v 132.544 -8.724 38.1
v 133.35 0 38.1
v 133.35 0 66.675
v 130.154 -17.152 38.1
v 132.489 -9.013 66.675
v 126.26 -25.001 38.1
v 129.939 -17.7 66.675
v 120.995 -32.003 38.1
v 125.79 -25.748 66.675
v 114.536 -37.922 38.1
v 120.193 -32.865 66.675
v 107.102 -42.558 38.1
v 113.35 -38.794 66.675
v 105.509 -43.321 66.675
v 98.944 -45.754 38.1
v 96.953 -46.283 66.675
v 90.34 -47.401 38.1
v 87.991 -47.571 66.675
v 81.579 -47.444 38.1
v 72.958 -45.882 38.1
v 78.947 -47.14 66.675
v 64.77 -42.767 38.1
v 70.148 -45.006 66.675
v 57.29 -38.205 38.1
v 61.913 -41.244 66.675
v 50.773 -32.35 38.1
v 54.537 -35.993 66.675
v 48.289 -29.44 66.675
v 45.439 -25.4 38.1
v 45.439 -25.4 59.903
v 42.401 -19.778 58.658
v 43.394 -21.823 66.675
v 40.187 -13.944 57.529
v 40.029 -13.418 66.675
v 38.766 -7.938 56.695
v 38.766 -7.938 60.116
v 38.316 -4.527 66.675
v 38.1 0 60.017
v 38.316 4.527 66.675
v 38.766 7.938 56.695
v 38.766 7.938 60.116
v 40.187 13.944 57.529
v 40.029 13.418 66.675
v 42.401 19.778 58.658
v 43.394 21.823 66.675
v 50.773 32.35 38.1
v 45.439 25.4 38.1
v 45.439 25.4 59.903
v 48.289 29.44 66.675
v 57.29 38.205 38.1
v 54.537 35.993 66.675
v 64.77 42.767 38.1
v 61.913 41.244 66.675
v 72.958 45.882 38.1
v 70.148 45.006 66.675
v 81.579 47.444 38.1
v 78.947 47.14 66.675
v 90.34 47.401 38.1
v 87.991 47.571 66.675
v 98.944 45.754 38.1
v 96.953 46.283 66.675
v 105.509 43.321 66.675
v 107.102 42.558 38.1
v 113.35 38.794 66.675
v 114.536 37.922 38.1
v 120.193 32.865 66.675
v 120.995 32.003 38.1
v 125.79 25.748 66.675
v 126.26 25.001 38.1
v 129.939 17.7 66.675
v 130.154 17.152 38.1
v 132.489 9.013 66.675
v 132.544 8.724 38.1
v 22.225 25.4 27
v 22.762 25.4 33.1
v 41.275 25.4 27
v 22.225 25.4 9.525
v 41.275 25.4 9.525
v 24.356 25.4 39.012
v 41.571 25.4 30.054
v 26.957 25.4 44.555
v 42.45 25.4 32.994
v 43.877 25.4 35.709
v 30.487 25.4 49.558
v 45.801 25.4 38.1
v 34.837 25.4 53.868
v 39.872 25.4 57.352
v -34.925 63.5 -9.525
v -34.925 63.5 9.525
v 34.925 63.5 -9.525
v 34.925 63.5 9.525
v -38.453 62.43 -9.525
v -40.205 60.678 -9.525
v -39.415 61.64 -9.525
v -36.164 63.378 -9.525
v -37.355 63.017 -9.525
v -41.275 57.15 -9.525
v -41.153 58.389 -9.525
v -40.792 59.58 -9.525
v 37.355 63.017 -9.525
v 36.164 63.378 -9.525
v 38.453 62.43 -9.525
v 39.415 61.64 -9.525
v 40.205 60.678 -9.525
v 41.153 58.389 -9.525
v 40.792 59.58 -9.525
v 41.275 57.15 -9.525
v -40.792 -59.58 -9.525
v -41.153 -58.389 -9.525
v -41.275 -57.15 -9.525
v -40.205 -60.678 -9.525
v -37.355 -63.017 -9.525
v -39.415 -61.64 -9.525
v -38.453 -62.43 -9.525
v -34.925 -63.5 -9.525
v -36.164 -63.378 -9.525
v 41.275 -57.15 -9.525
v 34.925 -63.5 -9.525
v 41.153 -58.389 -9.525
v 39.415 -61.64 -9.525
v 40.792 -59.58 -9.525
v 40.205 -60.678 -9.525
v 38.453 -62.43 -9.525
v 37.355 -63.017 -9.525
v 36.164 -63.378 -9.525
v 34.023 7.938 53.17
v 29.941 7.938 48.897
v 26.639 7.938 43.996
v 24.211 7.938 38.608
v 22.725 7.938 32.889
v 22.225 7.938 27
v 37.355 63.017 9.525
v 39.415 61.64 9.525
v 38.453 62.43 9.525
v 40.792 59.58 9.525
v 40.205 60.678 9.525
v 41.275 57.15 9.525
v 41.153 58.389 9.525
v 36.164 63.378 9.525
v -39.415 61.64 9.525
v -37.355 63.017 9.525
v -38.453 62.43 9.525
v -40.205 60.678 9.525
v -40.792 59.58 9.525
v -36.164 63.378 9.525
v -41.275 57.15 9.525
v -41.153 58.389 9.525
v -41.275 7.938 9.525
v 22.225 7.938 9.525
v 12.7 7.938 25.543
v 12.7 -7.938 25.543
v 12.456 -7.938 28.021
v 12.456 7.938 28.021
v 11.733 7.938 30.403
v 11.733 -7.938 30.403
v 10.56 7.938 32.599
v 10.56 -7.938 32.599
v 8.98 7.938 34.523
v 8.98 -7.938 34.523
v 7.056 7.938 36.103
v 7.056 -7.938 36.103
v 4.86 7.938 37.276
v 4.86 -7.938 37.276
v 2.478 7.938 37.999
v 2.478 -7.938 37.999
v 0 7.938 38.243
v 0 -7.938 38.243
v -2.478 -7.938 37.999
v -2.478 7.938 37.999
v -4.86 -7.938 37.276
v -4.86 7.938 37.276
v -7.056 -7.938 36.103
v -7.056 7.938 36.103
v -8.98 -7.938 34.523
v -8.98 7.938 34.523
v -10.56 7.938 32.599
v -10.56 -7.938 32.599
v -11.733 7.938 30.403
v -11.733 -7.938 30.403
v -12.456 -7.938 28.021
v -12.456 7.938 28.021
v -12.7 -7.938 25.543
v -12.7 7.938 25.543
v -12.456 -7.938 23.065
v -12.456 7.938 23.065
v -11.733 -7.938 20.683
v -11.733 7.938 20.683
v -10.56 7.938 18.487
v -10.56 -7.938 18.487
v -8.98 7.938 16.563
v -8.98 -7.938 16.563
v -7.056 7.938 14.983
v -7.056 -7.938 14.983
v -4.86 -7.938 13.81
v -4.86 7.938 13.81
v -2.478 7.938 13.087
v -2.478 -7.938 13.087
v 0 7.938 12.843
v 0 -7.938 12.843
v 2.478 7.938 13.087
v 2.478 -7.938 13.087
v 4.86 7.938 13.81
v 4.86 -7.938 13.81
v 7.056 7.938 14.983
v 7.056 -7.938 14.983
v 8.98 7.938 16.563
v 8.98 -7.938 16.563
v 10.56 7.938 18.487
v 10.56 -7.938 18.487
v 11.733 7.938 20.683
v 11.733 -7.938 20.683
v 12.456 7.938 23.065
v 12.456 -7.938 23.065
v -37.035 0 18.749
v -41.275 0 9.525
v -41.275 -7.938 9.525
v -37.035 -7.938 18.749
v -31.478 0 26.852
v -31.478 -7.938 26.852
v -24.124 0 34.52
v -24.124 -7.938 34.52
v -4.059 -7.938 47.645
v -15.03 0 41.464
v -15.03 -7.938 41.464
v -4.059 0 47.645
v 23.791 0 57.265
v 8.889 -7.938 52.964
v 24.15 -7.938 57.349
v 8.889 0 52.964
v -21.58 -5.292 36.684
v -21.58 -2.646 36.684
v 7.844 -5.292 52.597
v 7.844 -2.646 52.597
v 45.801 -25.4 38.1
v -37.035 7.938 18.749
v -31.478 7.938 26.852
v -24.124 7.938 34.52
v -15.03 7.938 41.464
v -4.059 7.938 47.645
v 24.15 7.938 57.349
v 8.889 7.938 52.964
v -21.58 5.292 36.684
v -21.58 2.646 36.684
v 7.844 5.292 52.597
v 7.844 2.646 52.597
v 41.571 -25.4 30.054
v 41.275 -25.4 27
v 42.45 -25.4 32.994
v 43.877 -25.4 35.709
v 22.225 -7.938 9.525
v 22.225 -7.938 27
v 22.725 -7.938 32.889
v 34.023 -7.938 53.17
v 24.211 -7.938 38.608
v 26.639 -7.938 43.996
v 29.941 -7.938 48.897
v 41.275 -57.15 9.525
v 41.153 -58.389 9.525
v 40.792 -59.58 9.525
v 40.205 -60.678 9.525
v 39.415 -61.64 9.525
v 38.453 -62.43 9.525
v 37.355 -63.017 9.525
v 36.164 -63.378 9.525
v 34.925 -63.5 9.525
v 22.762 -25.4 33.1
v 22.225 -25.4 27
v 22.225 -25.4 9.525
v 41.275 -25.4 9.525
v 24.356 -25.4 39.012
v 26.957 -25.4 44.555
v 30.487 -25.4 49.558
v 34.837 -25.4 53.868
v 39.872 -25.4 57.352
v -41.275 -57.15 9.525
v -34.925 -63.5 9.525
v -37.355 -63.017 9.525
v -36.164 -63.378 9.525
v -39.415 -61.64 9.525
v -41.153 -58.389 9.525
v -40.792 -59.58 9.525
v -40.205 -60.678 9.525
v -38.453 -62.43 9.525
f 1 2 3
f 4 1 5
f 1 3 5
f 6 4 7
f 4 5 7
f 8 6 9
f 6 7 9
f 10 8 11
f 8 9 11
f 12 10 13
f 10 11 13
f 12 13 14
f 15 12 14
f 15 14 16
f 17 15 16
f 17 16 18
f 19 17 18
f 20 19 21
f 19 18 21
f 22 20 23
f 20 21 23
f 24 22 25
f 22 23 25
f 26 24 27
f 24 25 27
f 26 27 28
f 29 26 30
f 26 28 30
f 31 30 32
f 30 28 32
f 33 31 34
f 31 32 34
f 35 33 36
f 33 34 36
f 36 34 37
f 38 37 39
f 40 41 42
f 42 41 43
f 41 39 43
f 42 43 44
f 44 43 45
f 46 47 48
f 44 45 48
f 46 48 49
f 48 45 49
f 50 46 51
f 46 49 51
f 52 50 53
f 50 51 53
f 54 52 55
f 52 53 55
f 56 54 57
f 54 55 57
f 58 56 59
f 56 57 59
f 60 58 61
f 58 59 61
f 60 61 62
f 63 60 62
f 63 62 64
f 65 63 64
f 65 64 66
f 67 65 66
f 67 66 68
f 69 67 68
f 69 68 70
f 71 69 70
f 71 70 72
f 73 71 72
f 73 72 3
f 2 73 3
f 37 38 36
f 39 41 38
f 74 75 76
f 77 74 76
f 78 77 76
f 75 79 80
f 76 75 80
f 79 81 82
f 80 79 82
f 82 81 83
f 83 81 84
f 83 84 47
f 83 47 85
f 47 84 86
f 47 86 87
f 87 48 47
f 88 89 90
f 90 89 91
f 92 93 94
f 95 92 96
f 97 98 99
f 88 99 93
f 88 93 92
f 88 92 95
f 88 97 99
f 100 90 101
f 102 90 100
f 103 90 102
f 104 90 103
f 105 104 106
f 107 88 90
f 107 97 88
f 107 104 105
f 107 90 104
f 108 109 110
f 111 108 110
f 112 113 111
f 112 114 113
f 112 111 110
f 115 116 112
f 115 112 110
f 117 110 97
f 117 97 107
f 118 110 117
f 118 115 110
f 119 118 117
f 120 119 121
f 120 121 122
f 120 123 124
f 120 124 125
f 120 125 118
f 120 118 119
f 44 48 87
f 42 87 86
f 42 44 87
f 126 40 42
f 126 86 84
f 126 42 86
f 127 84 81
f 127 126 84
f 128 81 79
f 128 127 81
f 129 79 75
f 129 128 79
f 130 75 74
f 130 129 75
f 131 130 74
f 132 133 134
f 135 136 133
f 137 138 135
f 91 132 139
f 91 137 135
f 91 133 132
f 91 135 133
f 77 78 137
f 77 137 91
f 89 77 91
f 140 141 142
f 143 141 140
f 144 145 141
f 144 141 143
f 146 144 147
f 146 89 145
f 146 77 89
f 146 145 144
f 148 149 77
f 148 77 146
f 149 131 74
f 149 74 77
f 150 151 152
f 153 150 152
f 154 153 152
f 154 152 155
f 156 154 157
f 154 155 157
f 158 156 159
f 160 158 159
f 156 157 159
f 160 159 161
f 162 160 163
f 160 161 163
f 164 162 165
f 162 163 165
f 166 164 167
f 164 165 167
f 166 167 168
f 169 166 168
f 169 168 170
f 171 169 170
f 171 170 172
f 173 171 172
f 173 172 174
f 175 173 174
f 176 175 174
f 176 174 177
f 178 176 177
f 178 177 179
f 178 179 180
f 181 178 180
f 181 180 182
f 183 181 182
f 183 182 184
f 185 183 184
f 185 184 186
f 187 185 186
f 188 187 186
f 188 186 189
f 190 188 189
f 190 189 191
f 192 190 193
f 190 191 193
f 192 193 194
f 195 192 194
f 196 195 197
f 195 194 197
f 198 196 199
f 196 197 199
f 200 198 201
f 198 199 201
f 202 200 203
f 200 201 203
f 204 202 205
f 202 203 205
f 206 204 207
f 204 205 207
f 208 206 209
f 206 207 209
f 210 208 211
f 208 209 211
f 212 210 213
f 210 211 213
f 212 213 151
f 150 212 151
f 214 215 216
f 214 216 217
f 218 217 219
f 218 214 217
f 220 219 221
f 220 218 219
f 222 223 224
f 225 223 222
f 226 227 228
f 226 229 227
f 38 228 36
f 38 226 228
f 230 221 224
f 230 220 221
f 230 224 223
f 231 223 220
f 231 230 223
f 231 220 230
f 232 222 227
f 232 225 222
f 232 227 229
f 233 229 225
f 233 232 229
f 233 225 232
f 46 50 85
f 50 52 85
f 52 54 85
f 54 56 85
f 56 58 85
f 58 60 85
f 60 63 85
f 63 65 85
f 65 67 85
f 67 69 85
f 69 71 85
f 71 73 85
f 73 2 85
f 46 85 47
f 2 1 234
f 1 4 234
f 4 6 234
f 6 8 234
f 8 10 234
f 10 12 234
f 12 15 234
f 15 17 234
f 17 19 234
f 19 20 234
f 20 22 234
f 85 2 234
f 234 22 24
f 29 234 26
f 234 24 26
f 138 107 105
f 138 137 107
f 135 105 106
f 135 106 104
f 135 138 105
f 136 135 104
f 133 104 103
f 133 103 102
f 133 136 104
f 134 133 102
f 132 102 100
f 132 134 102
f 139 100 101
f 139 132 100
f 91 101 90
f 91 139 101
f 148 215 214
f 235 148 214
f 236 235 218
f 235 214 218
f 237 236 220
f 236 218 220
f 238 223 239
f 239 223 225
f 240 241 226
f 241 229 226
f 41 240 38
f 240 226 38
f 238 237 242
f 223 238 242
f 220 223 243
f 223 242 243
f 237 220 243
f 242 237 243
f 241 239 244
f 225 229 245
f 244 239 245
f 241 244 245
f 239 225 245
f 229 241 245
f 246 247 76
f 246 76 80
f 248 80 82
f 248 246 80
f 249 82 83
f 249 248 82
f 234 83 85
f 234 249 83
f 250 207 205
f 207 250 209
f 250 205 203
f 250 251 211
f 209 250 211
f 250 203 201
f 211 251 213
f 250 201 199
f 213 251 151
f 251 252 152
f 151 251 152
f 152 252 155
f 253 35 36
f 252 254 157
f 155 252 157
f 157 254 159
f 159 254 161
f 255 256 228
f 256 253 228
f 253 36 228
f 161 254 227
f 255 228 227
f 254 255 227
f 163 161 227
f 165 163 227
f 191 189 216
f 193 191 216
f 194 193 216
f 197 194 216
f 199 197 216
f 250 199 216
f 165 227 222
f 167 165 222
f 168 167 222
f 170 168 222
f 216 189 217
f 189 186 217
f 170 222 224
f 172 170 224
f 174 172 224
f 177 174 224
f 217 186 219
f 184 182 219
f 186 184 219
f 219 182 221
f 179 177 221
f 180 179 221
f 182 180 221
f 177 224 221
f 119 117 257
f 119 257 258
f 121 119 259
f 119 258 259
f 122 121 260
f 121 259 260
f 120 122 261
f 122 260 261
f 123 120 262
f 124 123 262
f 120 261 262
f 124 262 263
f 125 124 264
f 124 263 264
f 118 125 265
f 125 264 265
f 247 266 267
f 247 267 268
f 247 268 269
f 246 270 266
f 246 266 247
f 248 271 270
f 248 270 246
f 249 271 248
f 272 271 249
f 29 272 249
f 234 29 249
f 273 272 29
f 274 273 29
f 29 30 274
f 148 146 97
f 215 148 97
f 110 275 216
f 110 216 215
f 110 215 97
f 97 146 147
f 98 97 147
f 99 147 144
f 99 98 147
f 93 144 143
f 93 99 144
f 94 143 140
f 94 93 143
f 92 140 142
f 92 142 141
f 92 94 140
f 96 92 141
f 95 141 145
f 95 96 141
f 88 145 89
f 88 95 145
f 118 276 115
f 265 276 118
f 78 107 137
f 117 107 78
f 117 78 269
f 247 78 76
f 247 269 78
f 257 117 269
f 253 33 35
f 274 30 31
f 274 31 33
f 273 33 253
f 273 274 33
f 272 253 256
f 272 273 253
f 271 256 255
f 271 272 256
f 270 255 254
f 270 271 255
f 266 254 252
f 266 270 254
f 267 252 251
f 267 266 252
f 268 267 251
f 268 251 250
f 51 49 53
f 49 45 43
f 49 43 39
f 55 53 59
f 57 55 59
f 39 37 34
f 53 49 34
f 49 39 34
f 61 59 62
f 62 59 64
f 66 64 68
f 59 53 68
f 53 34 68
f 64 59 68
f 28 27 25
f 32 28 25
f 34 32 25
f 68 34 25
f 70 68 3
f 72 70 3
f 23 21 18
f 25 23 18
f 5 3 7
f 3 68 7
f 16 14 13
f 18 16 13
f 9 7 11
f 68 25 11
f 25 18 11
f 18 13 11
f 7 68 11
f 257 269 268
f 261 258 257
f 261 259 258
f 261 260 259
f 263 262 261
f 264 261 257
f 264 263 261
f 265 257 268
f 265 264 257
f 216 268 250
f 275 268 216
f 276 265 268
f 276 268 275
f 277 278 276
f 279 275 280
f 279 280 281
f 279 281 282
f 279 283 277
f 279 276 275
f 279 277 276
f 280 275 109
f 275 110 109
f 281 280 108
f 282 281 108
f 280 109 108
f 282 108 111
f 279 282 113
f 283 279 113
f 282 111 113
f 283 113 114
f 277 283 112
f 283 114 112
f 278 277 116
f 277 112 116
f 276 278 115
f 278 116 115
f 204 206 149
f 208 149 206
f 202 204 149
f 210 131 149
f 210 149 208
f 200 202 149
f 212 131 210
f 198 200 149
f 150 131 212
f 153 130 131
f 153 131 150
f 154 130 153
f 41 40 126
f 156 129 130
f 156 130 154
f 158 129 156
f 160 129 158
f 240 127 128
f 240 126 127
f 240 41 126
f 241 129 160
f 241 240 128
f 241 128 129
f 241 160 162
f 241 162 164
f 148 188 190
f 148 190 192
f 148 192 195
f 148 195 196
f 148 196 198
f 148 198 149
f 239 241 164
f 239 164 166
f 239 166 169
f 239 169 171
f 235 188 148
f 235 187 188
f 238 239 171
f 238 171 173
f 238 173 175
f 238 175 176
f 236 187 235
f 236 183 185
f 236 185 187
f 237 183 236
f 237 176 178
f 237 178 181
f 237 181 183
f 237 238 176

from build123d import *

# Parameters (mm, degrees)
F1_DEPTH = 63.5
F2_DEPTH = 25.4
F3_DEPTH = 7.9375
F5_R     = 6.35
F6_R     = 12.7
F7_DEPTH = 50.8


with BuildPart() as f1:
    # F0 (on Front) → F1 (new body, symmetric)
    with BuildSketch(Plane.XZ):
        Polygon((22.225, 9.525), (-41.275, 9.525), (-41.275, -9.525), (41.275, -9.525), (41.275, 9.525), align=None)
    extrude(amount=F1_DEPTH, both=True)

    # F0 (on Front) → F2 (join, symmetric)
    with BuildSketch(Plane.XZ):
        with BuildLine():
            Line((22.225, 27.0002), (22.225, 9.525))
            Line((22.225, 9.525), (41.275, 9.525))
            Line((41.275, 9.525), (41.275, 27.0002))
            ThreePointArc((41.275, 27.0002), (45.9246798487, 38.2255201513), (57.15, 42.8752))
            Line((57.15, 42.8752), (57.15, 61.9252))
            add(Edge.make_bspline(
                [(52.9911566186, 61.6766999204), (54.4399345917, 61.780290683), (55.8288716771, 61.8622040359), (57.15, 61.9252)],
                knots=[0.6317574931, 0.6317574931, 0.6317574931, 0.6317574931, 0.6639097579, 0.6639097579, 0.6639097579, 0.6639097579], degree=3))
            ThreePointArc((52.9911566186, 61.6766999204), (31.0252681344, 50.1789404738), (22.225, 27.0002))
        make_face()
        with BuildLine():
            Line((72.6181762576, 61.9252), (57.15, 61.9252))
            Line((57.15, 61.9252), (57.15, 42.8752))
            Line((57.15, 42.8752), (85.725, 42.8752))
            Line((85.725, 42.8752), (85.725, 61.9252))
            add(Edge.make_bspline(
                [(72.6181762576, 61.9252), (77.3737433111, 61.7384817546), (81.2709365488, 61.5258076735), (85.725, 61.9252)],
                knots=[0.8210339091, 0.8210339091, 0.8210339091, 0.8210339091, 1, 1, 1, 1], degree=3))
        make_face()
    extrude(amount=F2_DEPTH, both=True)

    # F0 (on Front) → F3 (join, symmetric)
    with BuildSketch(Plane.XZ):
        with BuildLine():
            add(Edge.make_bspline(
                [(-41.275, 9.525), (-27.0460967422, 49.236584083), (24.5242244587, 59.6412526224), (52.9911566186, 61.6766999204)],
                knots=[0, 0, 0, 0, 0.6317574931, 0.6317574931, 0.6317574931, 0.6317574931], degree=3))
            Line((-41.275, 9.525), (22.225, 9.525))
            Line((22.225, 9.525), (22.225, 27.0002))
            ThreePointArc((22.225, 27.0002), (31.0252681344, 50.1789404738), (52.9911566186, 61.6766999204))
        make_face()
    extrude(amount=F3_DEPTH, both=True)

    # F0 (on Front) → F4 (revolve)
    with BuildSketch(Plane.XZ):
        Polygon((133.35, 66.675), (85.725, 66.675), (85.725, 61.9252), (85.725, 42.8752), (85.725, 38.1), (133.35, 38.1), align=None)
    revolve(axis=Axis((85.725, 0, 52.3875), (0, 0, -1)))

    # F5
    f5_edges = [f1.edges().sort_by_distance(p)[0] for p in [
        (41.275, -63.5, 0),
        (-41.275, -63.5, 0),
        (-41.275, 63.5, 0),
        (41.275, 63.5, 0),
    ]]
    fillet(f5_edges, radius=F5_R)

    # F6 (on face) → F7 (cut)
    with BuildSketch(Plane.XZ.offset(7.9375)):
        with Locations((0, 25.5429092795)):
            Circle(F6_R)
    extrude(amount=-F7_DEPTH, mode=Mode.SUBTRACT)


solid = f1.part
